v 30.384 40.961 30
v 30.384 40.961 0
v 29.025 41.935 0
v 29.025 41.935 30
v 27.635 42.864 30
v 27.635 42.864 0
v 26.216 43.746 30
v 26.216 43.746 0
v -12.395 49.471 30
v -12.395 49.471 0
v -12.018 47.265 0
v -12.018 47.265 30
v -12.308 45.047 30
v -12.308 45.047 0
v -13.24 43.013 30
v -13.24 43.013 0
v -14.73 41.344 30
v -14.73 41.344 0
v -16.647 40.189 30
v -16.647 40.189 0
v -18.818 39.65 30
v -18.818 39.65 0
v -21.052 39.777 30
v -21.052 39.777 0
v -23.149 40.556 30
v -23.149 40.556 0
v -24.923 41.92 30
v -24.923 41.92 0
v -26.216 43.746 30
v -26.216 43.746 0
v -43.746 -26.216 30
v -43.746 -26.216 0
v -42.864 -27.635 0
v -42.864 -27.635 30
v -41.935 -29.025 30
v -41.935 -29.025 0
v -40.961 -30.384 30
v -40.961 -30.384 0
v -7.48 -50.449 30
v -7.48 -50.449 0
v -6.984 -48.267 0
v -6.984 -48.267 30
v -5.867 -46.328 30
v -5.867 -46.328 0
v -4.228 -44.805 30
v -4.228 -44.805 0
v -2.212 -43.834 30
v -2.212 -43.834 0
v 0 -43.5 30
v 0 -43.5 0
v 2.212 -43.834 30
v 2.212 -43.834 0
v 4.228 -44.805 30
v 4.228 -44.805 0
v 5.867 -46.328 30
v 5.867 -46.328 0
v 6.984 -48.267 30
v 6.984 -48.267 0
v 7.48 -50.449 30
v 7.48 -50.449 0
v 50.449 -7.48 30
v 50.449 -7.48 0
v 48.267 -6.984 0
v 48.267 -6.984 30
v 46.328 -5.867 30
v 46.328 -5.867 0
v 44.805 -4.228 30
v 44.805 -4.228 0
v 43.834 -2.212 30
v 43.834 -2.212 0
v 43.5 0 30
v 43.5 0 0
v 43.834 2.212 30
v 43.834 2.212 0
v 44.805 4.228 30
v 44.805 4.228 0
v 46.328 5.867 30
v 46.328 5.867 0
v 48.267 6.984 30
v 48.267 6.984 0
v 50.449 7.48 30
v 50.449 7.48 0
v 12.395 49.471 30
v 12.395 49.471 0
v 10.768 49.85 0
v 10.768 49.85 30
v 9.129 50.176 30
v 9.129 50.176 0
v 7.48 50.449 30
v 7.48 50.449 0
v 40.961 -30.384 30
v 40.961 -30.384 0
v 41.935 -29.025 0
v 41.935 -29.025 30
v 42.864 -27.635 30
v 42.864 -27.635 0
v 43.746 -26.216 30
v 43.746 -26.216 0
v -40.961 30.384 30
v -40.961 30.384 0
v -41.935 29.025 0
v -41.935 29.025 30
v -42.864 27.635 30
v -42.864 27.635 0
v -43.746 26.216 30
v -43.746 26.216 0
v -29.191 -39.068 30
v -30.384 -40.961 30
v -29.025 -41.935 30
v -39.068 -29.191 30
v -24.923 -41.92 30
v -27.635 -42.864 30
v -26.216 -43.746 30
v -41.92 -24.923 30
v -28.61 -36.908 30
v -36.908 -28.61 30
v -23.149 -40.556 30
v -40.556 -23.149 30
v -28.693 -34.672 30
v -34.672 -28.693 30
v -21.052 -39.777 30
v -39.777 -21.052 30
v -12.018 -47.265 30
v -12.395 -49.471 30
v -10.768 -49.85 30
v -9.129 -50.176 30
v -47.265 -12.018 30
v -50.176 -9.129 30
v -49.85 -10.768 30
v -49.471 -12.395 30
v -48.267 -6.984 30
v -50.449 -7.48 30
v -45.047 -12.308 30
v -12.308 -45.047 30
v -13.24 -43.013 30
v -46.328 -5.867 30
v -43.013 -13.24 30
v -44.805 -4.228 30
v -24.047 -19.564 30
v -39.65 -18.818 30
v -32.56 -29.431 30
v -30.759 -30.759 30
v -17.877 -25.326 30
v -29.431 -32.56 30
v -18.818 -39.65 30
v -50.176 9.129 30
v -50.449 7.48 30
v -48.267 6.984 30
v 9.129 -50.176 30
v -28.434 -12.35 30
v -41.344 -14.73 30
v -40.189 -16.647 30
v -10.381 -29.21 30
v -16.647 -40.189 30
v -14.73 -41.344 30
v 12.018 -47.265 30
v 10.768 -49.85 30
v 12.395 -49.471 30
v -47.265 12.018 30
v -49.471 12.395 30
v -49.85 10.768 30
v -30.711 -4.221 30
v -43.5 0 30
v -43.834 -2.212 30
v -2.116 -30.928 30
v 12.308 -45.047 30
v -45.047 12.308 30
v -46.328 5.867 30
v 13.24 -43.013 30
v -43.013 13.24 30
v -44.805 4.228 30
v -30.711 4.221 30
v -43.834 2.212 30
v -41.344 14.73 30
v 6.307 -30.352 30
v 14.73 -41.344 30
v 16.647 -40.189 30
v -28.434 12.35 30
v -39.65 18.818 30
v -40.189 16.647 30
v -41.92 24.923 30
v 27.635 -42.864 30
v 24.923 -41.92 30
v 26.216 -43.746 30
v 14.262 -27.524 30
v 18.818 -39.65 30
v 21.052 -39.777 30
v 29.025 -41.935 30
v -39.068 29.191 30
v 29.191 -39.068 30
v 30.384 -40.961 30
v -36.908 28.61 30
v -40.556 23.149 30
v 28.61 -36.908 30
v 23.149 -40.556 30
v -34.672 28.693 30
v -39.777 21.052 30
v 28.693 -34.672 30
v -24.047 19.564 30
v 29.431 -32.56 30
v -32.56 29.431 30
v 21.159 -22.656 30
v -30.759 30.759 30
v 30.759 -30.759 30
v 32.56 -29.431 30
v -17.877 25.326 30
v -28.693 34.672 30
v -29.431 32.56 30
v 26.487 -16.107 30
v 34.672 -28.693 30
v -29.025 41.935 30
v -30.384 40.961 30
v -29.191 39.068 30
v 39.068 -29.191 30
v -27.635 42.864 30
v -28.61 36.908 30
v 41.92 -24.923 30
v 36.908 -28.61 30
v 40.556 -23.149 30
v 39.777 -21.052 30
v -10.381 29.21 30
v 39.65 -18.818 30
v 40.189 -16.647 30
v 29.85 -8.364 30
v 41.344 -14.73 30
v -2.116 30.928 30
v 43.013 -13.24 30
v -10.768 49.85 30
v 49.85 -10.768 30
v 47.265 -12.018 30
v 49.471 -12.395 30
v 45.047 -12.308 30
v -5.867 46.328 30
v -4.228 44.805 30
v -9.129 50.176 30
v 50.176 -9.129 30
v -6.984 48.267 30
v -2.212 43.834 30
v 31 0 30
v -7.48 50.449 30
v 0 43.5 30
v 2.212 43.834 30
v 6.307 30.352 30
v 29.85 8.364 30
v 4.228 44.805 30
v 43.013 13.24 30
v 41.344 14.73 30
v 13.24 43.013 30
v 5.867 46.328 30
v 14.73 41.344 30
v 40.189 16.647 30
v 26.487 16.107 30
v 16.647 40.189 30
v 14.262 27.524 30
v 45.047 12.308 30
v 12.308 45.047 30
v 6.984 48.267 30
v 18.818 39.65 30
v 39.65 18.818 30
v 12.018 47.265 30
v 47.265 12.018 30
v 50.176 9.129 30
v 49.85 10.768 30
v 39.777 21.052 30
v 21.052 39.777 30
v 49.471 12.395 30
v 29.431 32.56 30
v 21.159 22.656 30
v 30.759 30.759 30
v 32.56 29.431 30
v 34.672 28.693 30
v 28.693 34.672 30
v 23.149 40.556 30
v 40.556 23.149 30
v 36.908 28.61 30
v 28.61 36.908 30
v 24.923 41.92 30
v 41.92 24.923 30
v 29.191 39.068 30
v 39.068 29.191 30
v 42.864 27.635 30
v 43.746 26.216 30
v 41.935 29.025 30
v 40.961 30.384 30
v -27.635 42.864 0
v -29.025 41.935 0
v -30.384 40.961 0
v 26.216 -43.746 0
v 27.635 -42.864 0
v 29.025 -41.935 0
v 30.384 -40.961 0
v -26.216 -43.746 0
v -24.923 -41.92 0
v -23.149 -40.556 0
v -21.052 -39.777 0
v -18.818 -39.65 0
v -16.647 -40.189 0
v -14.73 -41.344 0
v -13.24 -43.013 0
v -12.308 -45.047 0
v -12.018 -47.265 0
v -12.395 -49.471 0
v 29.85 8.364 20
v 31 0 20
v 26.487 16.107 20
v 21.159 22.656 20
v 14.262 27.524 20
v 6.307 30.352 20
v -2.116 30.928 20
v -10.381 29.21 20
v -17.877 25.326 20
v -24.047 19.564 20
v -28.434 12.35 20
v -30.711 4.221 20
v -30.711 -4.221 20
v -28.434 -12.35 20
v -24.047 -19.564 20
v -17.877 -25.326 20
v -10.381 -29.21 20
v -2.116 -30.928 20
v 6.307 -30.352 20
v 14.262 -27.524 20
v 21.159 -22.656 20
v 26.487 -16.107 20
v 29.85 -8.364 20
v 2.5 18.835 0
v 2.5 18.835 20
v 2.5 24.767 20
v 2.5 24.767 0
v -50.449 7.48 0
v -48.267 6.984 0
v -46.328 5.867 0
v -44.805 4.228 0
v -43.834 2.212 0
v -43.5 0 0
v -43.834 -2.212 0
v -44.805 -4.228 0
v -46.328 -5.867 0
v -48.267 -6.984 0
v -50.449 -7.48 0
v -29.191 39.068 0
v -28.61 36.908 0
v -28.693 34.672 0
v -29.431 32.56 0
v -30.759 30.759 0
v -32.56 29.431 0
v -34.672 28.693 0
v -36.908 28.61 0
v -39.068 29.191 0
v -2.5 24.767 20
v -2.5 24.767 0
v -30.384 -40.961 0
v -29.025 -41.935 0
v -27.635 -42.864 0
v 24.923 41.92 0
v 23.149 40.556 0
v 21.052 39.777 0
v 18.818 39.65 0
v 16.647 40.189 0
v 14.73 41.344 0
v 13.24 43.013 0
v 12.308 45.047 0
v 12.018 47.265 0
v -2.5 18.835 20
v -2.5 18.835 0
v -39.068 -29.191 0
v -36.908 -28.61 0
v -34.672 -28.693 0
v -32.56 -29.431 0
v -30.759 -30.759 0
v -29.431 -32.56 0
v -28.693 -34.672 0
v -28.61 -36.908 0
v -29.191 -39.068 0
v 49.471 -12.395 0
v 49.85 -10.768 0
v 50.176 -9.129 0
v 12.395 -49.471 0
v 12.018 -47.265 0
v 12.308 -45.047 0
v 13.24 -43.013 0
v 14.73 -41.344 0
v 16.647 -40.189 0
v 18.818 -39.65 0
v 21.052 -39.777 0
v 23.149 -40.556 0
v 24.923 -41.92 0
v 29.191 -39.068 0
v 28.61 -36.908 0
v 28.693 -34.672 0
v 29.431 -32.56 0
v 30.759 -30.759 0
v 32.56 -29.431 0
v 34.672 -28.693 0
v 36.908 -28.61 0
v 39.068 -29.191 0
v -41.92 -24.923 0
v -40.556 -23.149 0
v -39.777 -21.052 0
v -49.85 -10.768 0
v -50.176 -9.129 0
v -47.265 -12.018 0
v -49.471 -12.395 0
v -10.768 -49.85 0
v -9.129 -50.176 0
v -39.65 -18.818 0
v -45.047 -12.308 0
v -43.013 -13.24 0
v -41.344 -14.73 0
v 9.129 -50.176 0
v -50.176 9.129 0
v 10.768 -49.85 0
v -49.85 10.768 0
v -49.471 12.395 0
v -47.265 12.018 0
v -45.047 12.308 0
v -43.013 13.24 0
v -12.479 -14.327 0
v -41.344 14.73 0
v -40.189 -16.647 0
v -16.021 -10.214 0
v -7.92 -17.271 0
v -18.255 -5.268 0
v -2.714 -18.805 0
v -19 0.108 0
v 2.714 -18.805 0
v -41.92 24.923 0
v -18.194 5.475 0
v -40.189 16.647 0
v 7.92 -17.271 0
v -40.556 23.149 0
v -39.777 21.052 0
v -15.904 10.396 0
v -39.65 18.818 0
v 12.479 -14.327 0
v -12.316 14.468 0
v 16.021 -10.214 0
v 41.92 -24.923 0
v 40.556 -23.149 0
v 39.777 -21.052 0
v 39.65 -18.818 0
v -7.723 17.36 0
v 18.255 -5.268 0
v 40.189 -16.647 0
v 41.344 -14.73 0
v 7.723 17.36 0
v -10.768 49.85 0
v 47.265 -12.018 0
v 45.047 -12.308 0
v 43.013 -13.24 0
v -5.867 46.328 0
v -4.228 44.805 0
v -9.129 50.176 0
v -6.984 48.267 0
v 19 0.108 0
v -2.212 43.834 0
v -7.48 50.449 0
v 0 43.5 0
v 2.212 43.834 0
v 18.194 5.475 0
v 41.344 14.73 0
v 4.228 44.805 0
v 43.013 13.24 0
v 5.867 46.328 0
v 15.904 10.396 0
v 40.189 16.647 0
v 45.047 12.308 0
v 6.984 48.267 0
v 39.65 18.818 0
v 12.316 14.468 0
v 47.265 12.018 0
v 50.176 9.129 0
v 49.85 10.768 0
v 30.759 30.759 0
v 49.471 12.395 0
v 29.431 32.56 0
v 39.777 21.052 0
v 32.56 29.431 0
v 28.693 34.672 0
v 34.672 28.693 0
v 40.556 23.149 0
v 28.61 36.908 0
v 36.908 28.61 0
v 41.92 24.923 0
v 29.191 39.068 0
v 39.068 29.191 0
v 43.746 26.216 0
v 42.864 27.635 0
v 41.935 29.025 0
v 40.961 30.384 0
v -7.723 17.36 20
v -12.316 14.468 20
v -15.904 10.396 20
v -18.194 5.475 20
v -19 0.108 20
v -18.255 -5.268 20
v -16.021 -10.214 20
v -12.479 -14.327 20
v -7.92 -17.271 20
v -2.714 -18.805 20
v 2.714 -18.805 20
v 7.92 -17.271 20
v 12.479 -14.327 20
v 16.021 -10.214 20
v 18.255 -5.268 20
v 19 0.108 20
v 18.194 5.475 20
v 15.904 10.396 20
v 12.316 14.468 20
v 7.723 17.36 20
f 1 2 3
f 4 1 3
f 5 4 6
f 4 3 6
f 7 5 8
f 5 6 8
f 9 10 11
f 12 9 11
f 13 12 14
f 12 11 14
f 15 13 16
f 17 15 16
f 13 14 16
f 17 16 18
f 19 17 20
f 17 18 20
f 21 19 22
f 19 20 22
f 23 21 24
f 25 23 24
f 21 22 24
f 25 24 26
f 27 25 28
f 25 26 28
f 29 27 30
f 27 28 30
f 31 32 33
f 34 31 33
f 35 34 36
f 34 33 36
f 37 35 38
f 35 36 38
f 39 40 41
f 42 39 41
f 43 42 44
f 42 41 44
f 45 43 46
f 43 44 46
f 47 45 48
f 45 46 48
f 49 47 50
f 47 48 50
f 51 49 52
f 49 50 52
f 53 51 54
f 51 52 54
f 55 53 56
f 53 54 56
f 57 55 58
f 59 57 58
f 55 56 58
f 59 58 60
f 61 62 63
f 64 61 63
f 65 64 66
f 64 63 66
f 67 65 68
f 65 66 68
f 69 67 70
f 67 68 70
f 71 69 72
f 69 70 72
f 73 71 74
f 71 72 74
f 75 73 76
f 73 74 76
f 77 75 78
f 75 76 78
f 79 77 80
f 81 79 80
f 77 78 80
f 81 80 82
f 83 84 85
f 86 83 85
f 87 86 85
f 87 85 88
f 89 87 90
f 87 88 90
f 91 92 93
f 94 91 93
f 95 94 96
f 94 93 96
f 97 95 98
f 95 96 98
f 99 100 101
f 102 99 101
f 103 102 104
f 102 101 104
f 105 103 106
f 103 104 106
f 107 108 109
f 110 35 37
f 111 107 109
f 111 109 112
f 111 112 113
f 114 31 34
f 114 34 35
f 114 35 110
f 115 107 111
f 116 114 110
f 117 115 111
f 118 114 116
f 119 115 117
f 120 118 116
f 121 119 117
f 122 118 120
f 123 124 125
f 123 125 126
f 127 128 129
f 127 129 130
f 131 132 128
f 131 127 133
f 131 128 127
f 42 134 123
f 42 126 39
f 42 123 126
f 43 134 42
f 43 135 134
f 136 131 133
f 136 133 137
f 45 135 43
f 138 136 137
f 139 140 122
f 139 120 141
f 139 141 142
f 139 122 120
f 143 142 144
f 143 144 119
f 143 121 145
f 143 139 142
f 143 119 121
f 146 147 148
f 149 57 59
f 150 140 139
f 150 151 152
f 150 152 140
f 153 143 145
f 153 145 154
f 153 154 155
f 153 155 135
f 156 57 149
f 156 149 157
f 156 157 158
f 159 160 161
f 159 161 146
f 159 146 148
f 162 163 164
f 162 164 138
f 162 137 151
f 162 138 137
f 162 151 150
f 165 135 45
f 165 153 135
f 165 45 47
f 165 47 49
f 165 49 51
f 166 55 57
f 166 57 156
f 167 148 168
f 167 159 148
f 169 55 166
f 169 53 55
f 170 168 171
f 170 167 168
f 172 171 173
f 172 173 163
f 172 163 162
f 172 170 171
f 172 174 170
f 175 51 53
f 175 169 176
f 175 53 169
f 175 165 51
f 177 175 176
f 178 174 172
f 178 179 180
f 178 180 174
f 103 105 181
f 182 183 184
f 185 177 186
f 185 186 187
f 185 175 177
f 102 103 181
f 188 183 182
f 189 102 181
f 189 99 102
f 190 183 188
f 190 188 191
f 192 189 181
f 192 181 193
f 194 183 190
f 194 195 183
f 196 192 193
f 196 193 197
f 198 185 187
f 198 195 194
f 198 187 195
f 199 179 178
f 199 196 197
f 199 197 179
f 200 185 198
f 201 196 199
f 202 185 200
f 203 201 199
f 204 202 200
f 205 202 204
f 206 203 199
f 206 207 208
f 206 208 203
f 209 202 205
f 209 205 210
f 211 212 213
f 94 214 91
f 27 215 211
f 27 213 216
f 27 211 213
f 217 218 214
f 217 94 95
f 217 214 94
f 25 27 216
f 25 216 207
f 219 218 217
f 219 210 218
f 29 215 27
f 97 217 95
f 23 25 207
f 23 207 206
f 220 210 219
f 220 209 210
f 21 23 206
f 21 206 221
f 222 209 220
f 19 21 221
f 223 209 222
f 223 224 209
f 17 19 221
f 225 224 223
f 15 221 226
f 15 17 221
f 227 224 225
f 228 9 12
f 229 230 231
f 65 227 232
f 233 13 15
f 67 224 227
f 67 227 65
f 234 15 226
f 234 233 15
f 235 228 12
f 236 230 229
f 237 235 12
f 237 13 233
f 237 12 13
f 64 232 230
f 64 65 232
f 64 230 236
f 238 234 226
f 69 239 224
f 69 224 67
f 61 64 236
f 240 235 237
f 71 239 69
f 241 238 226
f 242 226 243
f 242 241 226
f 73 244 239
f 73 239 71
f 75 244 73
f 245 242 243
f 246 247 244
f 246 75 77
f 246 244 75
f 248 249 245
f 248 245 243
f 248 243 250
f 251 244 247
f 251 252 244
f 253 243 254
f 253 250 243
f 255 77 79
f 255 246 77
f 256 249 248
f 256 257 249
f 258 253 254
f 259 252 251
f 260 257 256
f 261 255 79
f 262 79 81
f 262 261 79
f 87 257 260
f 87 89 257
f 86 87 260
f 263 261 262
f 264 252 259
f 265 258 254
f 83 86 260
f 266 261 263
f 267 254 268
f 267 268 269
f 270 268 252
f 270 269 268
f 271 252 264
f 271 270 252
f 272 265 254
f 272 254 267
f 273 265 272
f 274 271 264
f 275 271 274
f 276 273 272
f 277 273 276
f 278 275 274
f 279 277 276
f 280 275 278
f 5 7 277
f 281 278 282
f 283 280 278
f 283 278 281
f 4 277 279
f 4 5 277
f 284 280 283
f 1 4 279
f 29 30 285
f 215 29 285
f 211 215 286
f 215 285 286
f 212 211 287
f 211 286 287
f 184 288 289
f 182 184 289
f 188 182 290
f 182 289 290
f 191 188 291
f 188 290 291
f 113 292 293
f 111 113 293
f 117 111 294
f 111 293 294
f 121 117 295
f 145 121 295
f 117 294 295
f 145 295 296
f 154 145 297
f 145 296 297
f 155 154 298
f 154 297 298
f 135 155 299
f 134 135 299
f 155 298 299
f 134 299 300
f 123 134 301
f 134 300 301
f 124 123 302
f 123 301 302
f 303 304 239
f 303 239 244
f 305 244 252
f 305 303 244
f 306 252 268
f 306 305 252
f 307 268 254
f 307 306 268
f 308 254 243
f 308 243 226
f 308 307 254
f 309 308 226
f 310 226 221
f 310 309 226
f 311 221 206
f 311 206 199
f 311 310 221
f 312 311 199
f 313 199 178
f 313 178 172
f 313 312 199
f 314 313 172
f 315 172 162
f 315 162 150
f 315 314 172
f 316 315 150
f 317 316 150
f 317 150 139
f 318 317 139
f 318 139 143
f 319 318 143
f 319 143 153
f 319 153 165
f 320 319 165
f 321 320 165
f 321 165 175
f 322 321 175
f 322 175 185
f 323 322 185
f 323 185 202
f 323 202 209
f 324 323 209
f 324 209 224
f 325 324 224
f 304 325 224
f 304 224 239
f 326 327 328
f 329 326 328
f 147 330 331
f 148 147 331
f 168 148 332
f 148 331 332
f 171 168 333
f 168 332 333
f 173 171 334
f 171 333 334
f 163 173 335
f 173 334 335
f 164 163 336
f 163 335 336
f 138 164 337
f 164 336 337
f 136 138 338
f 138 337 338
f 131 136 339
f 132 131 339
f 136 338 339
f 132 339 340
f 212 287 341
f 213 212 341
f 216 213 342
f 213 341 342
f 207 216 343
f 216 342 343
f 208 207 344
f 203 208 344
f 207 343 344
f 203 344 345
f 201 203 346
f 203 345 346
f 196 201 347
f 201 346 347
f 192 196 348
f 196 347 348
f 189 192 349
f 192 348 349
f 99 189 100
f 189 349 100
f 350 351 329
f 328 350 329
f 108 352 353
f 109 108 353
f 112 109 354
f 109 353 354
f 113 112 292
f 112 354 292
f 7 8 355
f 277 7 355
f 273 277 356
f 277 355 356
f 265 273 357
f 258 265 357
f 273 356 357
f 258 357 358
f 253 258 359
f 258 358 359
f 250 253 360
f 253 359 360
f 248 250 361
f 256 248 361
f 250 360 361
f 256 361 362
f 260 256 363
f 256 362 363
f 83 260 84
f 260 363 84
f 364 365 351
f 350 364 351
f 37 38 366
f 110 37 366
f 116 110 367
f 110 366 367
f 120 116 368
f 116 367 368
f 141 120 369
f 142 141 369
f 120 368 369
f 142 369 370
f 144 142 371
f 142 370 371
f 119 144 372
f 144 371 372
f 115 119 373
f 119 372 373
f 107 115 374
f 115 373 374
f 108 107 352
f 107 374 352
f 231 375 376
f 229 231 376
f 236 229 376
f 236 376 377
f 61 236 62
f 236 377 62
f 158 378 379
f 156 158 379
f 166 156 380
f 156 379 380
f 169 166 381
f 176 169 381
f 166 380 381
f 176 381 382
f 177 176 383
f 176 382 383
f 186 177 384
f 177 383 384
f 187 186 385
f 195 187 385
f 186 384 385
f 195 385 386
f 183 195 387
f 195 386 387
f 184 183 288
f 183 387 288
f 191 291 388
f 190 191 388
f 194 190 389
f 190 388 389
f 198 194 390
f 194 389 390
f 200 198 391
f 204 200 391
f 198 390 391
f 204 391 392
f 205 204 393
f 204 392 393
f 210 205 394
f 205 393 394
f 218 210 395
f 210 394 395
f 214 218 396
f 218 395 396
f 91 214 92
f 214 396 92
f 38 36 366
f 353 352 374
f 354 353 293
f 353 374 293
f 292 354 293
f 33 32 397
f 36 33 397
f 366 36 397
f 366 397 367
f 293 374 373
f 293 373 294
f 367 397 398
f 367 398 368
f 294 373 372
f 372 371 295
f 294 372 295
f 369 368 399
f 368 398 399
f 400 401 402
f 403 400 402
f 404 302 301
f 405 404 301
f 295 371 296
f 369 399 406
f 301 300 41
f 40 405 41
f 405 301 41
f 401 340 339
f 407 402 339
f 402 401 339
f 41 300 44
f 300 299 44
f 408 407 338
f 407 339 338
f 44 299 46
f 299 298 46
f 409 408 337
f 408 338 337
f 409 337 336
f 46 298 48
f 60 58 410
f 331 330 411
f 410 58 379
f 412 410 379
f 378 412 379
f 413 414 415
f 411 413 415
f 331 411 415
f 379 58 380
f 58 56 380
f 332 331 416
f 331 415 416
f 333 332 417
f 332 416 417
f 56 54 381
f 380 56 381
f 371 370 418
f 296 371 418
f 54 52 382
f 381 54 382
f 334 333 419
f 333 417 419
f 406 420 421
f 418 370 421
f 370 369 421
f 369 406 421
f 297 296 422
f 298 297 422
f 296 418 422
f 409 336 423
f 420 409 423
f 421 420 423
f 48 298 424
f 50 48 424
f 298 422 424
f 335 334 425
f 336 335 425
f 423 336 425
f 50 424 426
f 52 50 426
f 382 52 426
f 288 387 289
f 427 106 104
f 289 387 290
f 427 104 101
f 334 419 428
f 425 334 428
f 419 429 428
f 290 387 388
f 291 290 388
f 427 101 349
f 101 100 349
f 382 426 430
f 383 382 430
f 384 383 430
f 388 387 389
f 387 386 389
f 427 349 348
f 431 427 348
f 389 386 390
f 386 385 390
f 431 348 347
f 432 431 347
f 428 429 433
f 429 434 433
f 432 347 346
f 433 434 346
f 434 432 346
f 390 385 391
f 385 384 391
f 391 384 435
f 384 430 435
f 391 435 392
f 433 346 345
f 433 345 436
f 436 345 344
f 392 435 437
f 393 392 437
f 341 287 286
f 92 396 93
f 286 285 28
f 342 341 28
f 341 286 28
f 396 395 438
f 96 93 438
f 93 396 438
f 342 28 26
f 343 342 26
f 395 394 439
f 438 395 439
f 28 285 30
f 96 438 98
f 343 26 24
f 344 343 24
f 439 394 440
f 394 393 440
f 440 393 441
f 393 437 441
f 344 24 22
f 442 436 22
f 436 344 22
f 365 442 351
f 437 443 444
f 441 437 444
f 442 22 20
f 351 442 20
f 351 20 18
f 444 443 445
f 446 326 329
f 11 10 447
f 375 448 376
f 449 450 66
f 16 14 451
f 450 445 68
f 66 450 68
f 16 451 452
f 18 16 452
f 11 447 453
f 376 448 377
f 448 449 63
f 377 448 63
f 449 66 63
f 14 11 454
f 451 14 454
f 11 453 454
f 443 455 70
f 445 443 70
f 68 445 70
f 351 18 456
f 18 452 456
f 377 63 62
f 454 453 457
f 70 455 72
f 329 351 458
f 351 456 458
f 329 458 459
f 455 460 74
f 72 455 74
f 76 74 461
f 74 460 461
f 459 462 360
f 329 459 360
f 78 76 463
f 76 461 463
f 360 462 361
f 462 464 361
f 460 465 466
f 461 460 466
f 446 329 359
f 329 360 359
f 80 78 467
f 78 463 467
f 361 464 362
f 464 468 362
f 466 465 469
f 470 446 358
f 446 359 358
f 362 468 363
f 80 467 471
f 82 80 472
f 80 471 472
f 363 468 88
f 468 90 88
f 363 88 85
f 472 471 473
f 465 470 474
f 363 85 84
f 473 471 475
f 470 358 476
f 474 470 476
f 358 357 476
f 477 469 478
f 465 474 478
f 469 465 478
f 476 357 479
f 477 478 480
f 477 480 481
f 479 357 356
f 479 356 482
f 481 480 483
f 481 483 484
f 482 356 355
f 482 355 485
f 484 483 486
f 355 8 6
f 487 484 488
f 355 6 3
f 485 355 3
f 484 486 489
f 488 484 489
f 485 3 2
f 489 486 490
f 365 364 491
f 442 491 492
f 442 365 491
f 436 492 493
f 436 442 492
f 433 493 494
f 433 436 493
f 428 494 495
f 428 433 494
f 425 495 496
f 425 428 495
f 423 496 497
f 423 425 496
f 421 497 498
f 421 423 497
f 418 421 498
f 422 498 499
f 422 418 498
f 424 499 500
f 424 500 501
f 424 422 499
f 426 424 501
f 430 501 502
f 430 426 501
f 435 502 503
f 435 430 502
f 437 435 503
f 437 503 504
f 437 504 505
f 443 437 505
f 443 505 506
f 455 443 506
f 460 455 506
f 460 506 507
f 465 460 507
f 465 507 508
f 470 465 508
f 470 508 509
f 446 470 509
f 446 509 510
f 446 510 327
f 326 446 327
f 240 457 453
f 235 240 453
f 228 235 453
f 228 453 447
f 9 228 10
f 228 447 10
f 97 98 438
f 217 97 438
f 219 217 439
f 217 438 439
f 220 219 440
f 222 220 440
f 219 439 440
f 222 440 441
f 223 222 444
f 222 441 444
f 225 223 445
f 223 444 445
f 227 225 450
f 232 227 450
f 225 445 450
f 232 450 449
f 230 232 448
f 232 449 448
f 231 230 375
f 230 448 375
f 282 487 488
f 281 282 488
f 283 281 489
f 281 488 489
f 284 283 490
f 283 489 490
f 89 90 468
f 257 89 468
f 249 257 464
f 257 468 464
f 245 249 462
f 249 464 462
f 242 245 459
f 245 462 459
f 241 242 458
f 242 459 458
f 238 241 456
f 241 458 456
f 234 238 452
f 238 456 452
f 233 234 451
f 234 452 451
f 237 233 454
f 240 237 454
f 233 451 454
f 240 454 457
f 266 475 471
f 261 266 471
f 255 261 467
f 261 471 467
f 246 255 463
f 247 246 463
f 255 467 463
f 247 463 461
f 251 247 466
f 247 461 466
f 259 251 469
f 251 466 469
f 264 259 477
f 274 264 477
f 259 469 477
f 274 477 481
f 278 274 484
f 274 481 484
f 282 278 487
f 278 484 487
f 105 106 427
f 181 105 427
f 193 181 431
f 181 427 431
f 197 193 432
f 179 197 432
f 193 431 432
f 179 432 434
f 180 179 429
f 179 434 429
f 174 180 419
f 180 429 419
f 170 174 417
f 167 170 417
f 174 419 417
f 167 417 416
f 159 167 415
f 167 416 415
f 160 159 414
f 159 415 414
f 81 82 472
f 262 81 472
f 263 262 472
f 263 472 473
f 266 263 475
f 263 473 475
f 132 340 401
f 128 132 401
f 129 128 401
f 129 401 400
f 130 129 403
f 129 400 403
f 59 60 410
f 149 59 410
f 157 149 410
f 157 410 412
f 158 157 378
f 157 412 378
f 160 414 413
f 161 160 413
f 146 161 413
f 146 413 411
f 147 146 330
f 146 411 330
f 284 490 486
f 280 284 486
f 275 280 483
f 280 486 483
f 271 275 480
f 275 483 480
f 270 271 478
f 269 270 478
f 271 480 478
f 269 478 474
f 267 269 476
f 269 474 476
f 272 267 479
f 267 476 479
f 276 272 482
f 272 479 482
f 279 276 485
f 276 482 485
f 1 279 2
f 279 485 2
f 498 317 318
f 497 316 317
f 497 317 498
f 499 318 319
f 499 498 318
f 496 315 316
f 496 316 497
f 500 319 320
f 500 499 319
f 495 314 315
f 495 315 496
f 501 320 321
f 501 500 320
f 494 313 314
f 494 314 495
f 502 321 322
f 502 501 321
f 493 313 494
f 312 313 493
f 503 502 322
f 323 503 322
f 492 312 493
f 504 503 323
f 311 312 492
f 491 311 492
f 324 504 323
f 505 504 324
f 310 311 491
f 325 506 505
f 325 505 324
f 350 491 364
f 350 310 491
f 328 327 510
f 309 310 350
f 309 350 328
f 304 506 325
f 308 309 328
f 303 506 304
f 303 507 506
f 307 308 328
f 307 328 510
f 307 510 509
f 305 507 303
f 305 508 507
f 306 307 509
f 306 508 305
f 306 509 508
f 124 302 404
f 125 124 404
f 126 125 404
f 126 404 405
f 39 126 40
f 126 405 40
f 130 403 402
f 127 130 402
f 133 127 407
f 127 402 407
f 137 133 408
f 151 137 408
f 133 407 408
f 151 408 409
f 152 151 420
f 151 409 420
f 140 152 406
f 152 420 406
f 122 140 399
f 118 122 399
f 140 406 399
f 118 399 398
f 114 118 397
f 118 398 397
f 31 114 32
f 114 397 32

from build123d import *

# Parameters (mm, degrees)
SKETCH1_R           = 31
BOSS_EXTRUDE1_DEPTH = 30
SKETCH1_3_R         = 31
SKETCH1_3_R_2       = 19
BOSS_EXTRUDE2_DEPTH = 20
SKETCH3_W           = 5
SKETCH3_H           = 12
CUT_EXTRUDE7_DEPTH  = 20


with BuildPart() as part:
    # Sketch1 → Boss-Extrude1 (new body)
    with BuildSketch(Plane.XY):
        with BuildLine():
            ThreePointArc((50.448529412, -7.479697868), (43.5, 0), (50.448529412, 7.479697868))
            ThreePointArc((50.448529412, 7.479697868), (50.020049301, 9.949606423), (49.470720222, 12.395476624))
            ThreePointArc((49.470720222, 12.395476624), (40.188759664, 16.646729308), (43.746007316, 26.216156162))
            ThreePointArc((43.746007316, 26.216156162), (42.404950227, 28.334081884), (40.961442331, 30.383552165))
            ThreePointArc((40.961442331, 30.383552165), (30.759144982, 30.759144982), (30.383552165, 40.961442331))
            ThreePointArc((30.383552165, 40.961442331), (28.334081884, 42.404950227), (26.216156162, 43.746007316))
            ThreePointArc((26.216156162, 43.746007316), (16.646729308, 40.188759664), (12.395476624, 49.470720222))
            ThreePointArc((12.395476624, 49.470720222), (9.949606423, 50.020049301), (7.479697868, 50.448529412))
            ThreePointArc((7.479697868, 50.448529412), (0, 43.5), (-7.479697868, 50.448529412))
            ThreePointArc((-7.479697868, 50.448529412), (-9.949606423, 50.020049301), (-12.395476624, 49.470720222))
            ThreePointArc((-12.395476624, 49.470720222), (-16.646729308, 40.188759664), (-26.216156162, 43.746007316))
            ThreePointArc((-26.216156162, 43.746007316), (-28.334081884, 42.404950227), (-30.383552165, 40.961442331))
            ThreePointArc((-30.383552165, 40.961442331), (-30.759144982, 30.759144982), (-40.961442331, 30.383552165))
            ThreePointArc((-40.961442331, 30.383552165), (-42.404950227, 28.334081884), (-43.746007316, 26.216156162))
            ThreePointArc((-43.746007316, 26.216156162), (-40.188759664, 16.646729308), (-49.470720222, 12.395476624))
            ThreePointArc((-49.470720222, 12.395476624), (-50.020049301, 9.949606423), (-50.448529412, 7.479697868))
            ThreePointArc((-50.448529412, 7.479697868), (-43.5, 0), (-50.448529412, -7.479697868))
            ThreePointArc((-50.448529412, -7.479697868), (-50.020049301, -9.949606423), (-49.470720222, -12.395476624))
            ThreePointArc((-49.470720222, -12.395476624), (-40.188759664, -16.646729308), (-43.746007316, -26.216156162))
            ThreePointArc((-43.746007316, -26.216156162), (-42.404950227, -28.334081884), (-40.961442331, -30.383552165))
            ThreePointArc((-40.961442331, -30.383552165), (-30.759144982, -30.759144982), (-30.383552165, -40.961442331))
            ThreePointArc((-30.383552165, -40.961442331), (-28.334081884, -42.404950227), (-26.216156162, -43.746007316))
            ThreePointArc((-26.216156162, -43.746007316), (-16.646729308, -40.188759664), (-12.395476624, -49.470720222))
            ThreePointArc((-12.395476624, -49.470720222), (-9.949606423, -50.020049301), (-7.479697868, -50.448529412))
            ThreePointArc((-7.479697868, -50.448529412), (0, -43.5), (7.479697868, -50.448529412))
            ThreePointArc((7.479697868, -50.448529412), (9.949606423, -50.020049301), (12.395476624, -49.470720222))
            ThreePointArc((12.395476624, -49.470720222), (16.646729308, -40.188759664), (26.216156162, -43.746007316))
            ThreePointArc((26.216156162, -43.746007316), (28.334081884, -42.404950227), (30.383552165, -40.961442331))
            ThreePointArc((30.383552165, -40.961442331), (30.759144982, -30.759144982), (40.961442331, -30.383552165))
            ThreePointArc((40.961442331, -30.383552165), (42.404950227, -28.334081884), (43.746007316, -26.216156162))
            ThreePointArc((43.746007316, -26.216156162), (40.188759664, -16.646729308), (49.470720222, -12.395476624))
            ThreePointArc((49.470720222, -12.395476624), (50.020049301, -9.949606423), (50.448529412, -7.479697868))
        make_face()
        Circle(SKETCH1_R, mode=Mode.SUBTRACT)
    extrude(amount=BOSS_EXTRUDE1_DEPTH)

    # Sketch1<3> → Boss-Extrude2 (add)
    with BuildSketch(Plane.XY):
        Circle(SKETCH1_3_R)
        Circle(SKETCH1_3_R_2, mode=Mode.SUBTRACT)
    extrude(amount=BOSS_EXTRUDE2_DEPTH)

    # Sketch3 → Cut-Extrude7 (cut)
    with BuildSketch(Plane.XY):
        with Locations((0, 18.767120851)):
            Rectangle(SKETCH3_W, SKETCH3_H)
    extrude(amount=CUT_EXTRUDE7_DEPTH, mode=Mode.SUBTRACT)


solid = part.part
